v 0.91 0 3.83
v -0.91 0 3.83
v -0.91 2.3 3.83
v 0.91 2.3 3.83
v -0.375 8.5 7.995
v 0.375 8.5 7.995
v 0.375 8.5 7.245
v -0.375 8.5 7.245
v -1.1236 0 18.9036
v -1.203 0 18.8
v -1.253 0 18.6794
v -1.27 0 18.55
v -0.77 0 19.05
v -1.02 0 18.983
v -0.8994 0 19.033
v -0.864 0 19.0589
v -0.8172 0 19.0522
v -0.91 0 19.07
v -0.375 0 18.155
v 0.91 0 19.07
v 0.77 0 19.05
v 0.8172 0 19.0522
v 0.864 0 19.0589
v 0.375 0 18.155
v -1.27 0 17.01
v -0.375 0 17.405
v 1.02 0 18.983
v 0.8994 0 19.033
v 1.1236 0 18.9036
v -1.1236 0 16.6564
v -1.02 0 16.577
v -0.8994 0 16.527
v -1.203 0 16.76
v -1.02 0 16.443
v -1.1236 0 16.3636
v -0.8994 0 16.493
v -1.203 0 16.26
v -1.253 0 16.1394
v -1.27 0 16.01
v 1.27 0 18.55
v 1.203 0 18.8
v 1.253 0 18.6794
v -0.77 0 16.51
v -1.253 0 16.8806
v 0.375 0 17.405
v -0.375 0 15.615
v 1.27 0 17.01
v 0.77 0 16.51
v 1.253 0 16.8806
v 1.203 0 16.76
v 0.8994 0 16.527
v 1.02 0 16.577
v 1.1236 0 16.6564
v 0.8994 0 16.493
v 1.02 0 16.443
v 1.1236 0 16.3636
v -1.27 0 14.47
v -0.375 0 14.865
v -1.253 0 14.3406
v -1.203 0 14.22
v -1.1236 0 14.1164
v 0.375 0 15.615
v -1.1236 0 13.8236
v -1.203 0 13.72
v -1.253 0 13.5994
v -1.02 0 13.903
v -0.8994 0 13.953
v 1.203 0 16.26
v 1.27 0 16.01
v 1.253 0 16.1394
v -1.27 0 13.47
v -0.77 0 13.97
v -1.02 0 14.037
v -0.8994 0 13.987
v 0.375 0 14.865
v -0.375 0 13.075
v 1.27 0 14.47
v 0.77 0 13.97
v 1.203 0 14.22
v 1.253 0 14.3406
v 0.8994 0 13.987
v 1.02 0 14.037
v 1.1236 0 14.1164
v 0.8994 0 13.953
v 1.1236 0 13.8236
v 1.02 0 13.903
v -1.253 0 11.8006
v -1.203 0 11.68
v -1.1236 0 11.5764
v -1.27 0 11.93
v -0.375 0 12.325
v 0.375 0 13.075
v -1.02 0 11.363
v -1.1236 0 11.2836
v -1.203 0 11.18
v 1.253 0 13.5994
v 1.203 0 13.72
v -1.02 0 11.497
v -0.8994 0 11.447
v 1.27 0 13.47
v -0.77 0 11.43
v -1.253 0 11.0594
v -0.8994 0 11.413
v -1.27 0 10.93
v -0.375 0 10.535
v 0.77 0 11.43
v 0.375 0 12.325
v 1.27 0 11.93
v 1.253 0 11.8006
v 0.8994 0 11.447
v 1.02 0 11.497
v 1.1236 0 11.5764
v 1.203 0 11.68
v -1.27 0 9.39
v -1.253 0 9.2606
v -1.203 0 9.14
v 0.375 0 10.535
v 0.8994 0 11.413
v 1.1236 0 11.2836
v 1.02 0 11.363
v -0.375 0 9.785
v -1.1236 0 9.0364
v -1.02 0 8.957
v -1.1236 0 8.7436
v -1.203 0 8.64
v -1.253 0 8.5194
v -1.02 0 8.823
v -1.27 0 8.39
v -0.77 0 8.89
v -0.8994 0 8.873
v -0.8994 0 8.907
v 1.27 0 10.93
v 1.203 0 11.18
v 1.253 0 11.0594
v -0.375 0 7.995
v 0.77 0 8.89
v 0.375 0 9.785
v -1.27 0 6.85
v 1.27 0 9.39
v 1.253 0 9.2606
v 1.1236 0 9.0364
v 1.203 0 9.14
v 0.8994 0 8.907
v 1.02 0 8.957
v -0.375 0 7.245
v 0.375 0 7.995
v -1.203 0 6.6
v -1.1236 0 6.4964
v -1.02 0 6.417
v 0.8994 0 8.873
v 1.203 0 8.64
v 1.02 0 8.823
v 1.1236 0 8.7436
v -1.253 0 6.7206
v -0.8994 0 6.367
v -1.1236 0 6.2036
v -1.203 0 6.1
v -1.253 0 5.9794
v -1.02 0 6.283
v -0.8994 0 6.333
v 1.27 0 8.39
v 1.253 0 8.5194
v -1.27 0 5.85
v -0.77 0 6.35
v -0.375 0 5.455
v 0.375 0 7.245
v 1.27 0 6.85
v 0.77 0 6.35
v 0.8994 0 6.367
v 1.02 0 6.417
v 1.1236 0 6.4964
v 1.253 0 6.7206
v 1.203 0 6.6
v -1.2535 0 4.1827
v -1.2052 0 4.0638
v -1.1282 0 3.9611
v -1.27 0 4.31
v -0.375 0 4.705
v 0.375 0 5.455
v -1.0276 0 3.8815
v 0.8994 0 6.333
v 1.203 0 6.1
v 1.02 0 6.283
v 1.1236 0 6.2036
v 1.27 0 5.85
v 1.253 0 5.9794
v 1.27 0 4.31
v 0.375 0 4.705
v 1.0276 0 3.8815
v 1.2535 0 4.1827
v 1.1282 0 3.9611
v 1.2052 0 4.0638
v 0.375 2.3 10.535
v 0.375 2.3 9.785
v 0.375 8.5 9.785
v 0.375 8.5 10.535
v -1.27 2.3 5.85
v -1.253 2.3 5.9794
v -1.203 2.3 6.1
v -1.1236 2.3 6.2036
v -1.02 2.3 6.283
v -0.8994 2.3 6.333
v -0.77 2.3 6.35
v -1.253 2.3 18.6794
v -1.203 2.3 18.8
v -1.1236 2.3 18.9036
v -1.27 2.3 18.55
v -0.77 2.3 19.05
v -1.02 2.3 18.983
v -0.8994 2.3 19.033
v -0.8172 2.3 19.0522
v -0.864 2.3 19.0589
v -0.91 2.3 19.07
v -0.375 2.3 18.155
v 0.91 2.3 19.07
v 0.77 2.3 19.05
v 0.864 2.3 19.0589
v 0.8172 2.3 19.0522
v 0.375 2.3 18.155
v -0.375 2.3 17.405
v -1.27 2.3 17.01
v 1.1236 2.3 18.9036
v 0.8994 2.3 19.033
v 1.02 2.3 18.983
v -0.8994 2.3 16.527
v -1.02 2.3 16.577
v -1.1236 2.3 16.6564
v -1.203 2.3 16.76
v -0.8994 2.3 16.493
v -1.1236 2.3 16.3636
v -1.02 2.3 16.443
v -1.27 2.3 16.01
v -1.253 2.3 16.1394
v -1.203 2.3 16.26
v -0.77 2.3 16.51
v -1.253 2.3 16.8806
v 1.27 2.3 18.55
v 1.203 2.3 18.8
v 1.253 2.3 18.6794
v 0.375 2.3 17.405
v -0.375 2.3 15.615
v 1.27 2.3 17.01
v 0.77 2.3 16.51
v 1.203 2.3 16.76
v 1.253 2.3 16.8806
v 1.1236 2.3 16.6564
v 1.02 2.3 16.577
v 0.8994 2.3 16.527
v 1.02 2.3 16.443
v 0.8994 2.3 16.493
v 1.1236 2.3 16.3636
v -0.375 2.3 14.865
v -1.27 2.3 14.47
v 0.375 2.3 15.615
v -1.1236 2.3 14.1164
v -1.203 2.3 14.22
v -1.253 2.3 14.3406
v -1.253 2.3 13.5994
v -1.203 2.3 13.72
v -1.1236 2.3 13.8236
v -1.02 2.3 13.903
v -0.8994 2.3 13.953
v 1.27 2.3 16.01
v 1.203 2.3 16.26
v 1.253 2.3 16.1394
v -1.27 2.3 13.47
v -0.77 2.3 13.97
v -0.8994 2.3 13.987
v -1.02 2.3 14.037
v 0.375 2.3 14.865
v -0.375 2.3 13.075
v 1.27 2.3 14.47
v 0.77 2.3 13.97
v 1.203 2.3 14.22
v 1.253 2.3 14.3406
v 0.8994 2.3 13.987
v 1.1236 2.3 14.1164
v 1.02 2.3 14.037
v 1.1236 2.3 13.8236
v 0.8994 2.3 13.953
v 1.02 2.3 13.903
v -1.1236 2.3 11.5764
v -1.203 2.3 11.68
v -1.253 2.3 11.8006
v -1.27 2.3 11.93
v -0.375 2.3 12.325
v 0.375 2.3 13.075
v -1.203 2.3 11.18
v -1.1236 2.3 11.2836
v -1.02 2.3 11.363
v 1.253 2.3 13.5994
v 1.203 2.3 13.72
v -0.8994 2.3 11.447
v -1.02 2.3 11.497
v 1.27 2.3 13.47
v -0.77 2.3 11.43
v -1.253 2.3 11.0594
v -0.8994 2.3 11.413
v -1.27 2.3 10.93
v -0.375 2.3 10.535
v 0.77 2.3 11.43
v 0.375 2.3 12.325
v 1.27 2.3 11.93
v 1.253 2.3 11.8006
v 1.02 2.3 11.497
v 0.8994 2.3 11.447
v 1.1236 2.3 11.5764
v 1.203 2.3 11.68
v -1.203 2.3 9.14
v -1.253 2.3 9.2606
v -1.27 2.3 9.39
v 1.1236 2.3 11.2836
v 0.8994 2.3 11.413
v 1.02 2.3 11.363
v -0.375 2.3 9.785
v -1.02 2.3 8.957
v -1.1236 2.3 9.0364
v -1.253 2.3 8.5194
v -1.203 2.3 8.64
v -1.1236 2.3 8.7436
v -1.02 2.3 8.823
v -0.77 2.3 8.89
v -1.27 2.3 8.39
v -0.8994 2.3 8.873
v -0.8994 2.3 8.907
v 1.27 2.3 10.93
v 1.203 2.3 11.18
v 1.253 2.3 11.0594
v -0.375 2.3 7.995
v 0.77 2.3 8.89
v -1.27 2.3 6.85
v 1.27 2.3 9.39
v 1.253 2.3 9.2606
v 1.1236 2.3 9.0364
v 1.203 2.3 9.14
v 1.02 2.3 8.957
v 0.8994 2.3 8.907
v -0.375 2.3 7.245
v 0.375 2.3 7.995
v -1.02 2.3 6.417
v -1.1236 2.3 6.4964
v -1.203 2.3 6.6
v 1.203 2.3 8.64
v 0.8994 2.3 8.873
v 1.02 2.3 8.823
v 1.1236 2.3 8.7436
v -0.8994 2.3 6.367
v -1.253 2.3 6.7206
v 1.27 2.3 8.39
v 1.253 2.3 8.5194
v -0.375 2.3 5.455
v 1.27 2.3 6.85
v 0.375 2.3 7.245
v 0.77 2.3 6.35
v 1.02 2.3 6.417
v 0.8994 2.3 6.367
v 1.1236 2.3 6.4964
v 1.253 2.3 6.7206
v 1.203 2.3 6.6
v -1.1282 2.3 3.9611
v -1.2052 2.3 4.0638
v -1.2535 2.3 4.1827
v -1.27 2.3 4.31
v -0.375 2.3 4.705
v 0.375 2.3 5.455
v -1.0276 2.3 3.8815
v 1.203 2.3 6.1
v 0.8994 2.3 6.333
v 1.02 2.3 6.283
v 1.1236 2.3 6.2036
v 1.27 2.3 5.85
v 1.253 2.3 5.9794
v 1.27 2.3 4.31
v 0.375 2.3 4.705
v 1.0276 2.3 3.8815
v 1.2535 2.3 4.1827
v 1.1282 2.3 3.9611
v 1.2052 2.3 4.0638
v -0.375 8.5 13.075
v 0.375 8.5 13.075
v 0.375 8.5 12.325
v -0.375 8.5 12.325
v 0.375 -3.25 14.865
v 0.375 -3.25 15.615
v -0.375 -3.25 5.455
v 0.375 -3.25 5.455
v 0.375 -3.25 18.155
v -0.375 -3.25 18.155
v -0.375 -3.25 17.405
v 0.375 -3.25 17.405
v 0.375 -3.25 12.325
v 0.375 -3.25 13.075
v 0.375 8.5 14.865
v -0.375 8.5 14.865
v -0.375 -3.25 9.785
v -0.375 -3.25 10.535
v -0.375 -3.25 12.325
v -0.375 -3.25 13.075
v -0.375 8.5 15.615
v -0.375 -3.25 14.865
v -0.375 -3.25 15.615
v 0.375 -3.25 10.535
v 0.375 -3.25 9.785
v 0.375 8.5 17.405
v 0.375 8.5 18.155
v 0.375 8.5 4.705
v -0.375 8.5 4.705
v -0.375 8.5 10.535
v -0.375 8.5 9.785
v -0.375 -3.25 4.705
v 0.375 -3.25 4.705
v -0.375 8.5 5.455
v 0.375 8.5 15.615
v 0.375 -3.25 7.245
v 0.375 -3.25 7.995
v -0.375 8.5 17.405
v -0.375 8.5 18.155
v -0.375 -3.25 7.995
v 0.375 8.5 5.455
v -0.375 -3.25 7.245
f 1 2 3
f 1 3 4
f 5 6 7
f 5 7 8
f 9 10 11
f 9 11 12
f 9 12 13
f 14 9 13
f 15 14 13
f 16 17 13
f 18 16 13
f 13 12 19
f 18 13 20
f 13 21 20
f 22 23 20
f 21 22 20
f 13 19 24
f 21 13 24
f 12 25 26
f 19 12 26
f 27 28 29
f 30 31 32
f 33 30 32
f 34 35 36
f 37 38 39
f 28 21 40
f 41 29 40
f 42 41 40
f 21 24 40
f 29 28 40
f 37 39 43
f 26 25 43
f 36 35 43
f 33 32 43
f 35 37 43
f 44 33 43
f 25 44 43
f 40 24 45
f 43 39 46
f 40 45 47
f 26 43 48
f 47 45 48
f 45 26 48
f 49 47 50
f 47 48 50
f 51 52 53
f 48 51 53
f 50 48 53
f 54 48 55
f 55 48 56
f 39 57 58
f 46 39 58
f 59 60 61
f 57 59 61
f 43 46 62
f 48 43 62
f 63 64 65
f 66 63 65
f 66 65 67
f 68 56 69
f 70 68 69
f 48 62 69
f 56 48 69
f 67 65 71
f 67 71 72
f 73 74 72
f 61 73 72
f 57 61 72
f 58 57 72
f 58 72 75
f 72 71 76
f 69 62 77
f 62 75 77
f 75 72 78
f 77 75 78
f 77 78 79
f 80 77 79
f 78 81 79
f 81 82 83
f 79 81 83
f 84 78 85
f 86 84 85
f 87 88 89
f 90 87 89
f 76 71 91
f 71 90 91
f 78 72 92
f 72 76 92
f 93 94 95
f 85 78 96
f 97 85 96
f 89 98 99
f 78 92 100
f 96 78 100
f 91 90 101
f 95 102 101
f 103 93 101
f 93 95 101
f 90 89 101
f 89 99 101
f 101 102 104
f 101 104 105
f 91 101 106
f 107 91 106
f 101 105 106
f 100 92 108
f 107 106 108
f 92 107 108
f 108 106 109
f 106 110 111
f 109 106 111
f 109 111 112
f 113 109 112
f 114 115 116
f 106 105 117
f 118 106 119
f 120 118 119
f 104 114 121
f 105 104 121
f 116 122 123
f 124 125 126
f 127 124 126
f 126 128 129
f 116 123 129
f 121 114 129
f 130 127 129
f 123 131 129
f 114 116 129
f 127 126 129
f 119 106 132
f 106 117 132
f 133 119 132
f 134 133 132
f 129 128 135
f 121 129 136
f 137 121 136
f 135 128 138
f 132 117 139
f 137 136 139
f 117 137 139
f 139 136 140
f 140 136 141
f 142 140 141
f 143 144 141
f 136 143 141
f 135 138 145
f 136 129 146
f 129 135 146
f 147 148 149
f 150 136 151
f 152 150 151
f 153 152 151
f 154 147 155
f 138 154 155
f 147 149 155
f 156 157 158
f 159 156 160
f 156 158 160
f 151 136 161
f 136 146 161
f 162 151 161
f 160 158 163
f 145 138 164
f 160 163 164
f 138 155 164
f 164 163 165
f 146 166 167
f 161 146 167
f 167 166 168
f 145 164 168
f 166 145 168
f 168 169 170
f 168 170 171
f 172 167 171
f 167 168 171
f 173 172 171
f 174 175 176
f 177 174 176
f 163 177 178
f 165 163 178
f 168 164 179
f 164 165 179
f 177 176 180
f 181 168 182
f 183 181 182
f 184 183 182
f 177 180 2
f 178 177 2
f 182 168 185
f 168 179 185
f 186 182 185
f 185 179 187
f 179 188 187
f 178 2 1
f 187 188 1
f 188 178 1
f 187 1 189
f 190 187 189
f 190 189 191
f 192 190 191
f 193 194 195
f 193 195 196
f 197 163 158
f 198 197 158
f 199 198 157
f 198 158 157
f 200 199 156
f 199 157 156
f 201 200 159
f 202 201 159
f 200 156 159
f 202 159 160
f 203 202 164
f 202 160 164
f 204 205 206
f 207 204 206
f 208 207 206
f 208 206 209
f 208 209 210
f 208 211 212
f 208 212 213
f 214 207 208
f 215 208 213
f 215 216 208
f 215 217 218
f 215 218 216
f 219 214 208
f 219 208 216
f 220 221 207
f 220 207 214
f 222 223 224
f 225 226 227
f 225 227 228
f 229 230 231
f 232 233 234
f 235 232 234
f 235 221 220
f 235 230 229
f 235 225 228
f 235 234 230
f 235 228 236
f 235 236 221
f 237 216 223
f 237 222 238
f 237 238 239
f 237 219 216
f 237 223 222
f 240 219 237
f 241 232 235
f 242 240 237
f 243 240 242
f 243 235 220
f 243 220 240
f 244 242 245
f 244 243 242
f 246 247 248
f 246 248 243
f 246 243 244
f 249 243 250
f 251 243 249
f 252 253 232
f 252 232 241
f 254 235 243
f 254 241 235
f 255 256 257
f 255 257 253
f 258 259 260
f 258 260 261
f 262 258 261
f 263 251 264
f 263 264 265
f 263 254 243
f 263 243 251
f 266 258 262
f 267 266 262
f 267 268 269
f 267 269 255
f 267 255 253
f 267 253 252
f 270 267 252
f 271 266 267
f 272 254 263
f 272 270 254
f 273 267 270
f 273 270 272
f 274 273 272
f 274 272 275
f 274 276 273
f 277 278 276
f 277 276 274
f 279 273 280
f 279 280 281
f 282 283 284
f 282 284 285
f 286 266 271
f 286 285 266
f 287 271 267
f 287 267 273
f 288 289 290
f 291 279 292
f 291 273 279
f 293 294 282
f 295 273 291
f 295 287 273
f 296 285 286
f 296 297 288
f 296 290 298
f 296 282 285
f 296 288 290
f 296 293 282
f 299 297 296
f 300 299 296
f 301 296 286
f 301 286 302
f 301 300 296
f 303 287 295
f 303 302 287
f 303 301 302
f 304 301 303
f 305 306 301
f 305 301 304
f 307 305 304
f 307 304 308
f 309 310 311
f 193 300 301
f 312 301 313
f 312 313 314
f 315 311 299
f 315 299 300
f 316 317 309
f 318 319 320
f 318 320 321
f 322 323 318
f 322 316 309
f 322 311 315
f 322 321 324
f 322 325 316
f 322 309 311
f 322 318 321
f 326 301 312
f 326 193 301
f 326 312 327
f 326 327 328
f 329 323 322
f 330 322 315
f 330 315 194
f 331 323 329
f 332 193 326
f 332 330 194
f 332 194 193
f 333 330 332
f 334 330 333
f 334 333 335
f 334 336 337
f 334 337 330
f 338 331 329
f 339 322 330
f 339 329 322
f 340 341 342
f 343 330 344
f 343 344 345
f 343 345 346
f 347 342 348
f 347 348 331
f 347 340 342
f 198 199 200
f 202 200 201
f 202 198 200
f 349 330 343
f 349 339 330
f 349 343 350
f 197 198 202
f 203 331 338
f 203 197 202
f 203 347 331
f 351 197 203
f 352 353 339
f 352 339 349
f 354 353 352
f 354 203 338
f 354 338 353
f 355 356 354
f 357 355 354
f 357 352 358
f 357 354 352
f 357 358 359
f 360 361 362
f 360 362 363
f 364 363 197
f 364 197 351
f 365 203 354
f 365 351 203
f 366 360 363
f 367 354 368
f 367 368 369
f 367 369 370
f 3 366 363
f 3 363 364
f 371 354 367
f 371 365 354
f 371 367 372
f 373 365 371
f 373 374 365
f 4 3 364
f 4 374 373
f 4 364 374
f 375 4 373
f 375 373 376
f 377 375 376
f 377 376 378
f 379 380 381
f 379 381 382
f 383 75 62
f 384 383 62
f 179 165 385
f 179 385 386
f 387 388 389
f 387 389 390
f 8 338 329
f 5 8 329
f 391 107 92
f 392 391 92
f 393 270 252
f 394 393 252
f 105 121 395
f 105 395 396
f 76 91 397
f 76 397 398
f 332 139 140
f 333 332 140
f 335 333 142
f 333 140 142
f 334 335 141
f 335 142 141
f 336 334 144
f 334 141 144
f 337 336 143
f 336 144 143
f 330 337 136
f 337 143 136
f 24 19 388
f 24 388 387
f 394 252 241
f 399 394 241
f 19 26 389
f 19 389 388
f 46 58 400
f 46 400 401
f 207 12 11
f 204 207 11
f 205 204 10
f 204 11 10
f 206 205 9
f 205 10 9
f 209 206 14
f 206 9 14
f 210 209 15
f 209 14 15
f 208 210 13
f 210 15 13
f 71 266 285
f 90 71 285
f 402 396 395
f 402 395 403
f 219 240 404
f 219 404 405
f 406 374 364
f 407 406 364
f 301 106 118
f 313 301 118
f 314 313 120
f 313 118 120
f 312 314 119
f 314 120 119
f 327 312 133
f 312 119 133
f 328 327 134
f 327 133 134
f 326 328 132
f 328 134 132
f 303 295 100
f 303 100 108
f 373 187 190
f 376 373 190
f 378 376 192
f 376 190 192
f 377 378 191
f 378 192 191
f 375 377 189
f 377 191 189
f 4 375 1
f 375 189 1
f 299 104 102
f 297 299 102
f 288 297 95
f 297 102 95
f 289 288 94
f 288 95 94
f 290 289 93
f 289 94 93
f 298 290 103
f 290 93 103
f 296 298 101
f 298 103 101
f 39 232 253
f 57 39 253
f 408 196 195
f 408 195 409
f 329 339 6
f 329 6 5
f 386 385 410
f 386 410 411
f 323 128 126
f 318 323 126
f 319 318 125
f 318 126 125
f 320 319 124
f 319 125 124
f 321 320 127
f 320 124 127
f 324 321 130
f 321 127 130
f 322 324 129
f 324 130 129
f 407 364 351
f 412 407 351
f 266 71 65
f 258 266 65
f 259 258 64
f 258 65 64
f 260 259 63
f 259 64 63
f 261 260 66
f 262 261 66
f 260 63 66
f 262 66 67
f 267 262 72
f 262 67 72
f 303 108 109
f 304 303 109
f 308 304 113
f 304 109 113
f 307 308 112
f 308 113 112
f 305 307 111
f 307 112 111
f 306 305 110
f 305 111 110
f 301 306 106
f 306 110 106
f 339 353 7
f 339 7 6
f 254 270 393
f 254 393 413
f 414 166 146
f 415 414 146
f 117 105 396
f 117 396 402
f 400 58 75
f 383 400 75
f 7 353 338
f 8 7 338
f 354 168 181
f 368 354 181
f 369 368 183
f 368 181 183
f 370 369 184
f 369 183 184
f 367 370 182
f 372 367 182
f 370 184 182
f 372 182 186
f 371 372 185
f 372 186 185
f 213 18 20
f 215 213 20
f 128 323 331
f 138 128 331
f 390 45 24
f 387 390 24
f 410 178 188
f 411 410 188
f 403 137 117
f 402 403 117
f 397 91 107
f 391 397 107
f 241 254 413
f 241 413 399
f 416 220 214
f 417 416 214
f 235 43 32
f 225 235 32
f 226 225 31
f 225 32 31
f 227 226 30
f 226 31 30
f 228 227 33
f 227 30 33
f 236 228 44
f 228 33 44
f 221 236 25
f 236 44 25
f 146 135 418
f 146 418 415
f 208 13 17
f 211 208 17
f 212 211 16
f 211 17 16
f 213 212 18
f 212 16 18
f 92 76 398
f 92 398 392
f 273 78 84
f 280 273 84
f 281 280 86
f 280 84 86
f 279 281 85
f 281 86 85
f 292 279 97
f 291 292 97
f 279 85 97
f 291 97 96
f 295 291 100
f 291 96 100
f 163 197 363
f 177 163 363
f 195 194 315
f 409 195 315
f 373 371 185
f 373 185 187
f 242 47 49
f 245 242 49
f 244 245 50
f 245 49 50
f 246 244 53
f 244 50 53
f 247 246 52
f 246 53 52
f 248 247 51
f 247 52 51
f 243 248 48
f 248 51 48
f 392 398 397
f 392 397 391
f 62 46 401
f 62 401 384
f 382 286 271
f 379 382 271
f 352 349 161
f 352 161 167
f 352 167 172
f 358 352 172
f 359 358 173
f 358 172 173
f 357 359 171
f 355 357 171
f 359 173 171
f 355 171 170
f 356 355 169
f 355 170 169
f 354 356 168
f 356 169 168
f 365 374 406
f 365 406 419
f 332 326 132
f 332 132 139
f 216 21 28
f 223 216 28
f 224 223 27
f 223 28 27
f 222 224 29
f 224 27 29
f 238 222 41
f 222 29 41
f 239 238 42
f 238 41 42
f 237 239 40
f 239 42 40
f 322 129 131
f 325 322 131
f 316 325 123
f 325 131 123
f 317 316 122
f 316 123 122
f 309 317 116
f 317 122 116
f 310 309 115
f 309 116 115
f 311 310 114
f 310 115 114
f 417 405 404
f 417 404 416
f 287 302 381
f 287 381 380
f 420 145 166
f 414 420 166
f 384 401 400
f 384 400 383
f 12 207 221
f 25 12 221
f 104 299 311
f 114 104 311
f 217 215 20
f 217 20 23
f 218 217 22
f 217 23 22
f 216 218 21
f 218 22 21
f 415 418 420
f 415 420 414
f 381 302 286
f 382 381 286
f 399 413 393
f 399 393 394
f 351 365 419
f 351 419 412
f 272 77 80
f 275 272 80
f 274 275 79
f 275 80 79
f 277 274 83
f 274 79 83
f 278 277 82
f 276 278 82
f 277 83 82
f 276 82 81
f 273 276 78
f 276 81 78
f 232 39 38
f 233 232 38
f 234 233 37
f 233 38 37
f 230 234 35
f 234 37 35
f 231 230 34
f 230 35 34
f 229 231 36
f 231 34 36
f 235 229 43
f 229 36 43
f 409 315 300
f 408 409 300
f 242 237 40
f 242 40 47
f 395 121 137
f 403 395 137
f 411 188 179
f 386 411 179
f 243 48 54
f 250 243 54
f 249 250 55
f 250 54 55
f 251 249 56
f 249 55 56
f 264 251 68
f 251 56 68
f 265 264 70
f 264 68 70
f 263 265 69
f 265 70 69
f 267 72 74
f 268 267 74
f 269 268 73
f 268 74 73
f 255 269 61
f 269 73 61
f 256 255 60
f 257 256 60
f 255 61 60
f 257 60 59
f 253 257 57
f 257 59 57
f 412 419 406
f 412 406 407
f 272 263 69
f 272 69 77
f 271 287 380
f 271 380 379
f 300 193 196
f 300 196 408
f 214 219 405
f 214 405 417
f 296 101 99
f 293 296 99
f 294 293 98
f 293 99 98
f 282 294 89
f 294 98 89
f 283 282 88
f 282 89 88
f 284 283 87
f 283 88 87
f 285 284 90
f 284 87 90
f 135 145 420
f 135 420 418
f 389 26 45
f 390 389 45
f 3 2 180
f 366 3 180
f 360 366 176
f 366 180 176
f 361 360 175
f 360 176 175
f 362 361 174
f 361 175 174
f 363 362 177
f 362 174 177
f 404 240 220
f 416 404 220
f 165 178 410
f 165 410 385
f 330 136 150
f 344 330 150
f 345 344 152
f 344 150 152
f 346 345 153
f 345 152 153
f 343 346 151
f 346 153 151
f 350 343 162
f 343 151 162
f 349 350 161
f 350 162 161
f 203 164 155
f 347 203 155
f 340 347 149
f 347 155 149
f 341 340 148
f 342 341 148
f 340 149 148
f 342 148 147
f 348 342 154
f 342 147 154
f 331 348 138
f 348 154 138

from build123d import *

# Parameters (mm, degrees)
CROQUIS1_W               = 2.54
CROQUIS1_H               = 15.24
SALIENTE_EXTRUIR1_DEPTH  = 2.3
CORTAR_EXTRUIR4_DEPTH    = 2.3
CORTAR_EXTRUIR5_DEPTH    = 2.3
CORTAR_EXTRUIR6_DEPTH    = 2.3
CORTAR_EXTRUIR7_DEPTH    = 2.3
CORTAR_EXTRUIR8_DEPTH    = 2.3
CORTAR_EXTRUIR9_DEPTH    = 2.3
CORTAR_EXTRUIR10_DEPTH   = 2.3
CORTAR_EXTRUIR13_DEPTH   = 2.3
CORTAR_EXTRUIR14_DEPTH   = 2.3
CORTAR_EXTRUIR15_DEPTH   = 2.3
CORTAR_EXTRUIR16_DEPTH   = 2.3
CORTAR_EXTRUIR17_DEPTH   = 2.3
CORTAR_EXTRUIR18_DEPTH   = 2.3
CORTAR_EXTRUIR19_DEPTH   = 2.3
CROQUIS27_W              = 0.75
CROQUIS27_H              = 0.75
SALIENTE_EXTRUIR5_DEPTH  = 6.2
CROQUIS28_W              = 0.75
CROQUIS28_H              = 0.75
SALIENTE_EXTRUIR6_DEPTH  = 6.2
CROQUIS29_W              = 0.75
CROQUIS29_H              = 0.75
SALIENTE_EXTRUIR7_DEPTH  = 6.2
CROQUIS30_W              = 0.75
CROQUIS30_H              = 0.75
SALIENTE_EXTRUIR8_DEPTH  = 6.2
CROQUIS31_W              = 0.75
CROQUIS31_H              = 0.75
SALIENTE_EXTRUIR9_DEPTH  = 6.2
CROQUIS32_W              = 0.75
CROQUIS32_H              = 0.75
SALIENTE_EXTRUIR10_DEPTH = 6.2
CROQUIS38_W              = 0.75
CROQUIS38_H              = 0.75
SALIENTE_EXTRUIR16_DEPTH = 3.25
CROQUIS39_W              = 0.75
CROQUIS39_H              = 0.75
SALIENTE_EXTRUIR17_DEPTH = 3.25
CROQUIS40_W              = 0.75
CROQUIS40_H              = 0.75
SALIENTE_EXTRUIR18_DEPTH = 3.25
CROQUIS41_W              = 0.75
CROQUIS41_H              = 0.75
SALIENTE_EXTRUIR19_DEPTH = 3.25
CROQUIS42_W              = 0.75
CROQUIS42_H              = 0.75
SALIENTE_EXTRUIR20_DEPTH = 3.25
CROQUIS43_W              = 0.75
CROQUIS43_H              = 0.75
SALIENTE_EXTRUIR21_DEPTH = 3.25


with BuildPart() as part:
    # Croquis1 → Saliente-Extruir1 (new body)
    with BuildSketch(Plane(origin=(0, 2.3, 0), x_dir=(1, 0, 0), z_dir=(0, 1, 0))):
        with Locations((0, -11.45)):
            Rectangle(CROQUIS1_W, CROQUIS1_H)
    extrude(amount=-SALIENTE_EXTRUIR1_DEPTH)

    # Croquis5 → Cortar-Extruir4 (cut)
    with BuildSketch(Plane.XZ):
        with BuildLine():
            Line((1.27, 18.55), (1.27, 19.55))
            ThreePointArc((1.27, 19.55), (1.123553391, 19.196446609), (0.77, 19.05))
            ThreePointArc((0.77, 19.05), (1.123553391, 18.903553391), (1.27, 18.55))
        make_face()
    extrude(amount=-CORTAR_EXTRUIR4_DEPTH, mode=Mode.SUBTRACT)

    # Croquis6 → Cortar-Extruir5 (cut)
    with BuildSketch(Plane.XZ):
        with BuildLine():
            Line((1.27, 16.01), (1.27, 17.01))
            ThreePointArc((1.27, 17.01), (1.123553391, 16.656446609), (0.77, 16.51))
            ThreePointArc((0.77, 16.51), (1.123553391, 16.363553391), (1.27, 16.01))
        make_face()
    extrude(amount=-CORTAR_EXTRUIR5_DEPTH, mode=Mode.SUBTRACT)

    # Croquis7 → Cortar-Extruir6 (cut)
    with BuildSketch(Plane.XZ):
        with BuildLine():
            Line((1.27, 13.47), (1.27, 14.47))
            ThreePointArc((1.27, 14.47), (1.123553391, 14.116446609), (0.77, 13.97))
            ThreePointArc((0.77, 13.97), (1.123553391, 13.823553391), (1.27, 13.47))
        make_face()
    extrude(amount=-CORTAR_EXTRUIR6_DEPTH, mode=Mode.SUBTRACT)

    # Croquis8 → Cortar-Extruir7 (cut)
    with BuildSketch(Plane.XZ):
        with BuildLine():
            Line((1.27, 10.93), (1.27, 11.93))
            ThreePointArc((1.27, 11.93), (1.123553391, 11.576446609), (0.77, 11.43))
            ThreePointArc((0.77, 11.43), (1.123553391, 11.283553391), (1.27, 10.93))
        make_face()
    extrude(amount=-CORTAR_EXTRUIR7_DEPTH, mode=Mode.SUBTRACT)

    # Croquis9 → Cortar-Extruir8 (cut)
    with BuildSketch(Plane.XZ):
        with BuildLine():
            Line((1.27, 8.39), (1.27, 9.39))
            ThreePointArc((1.27, 9.39), (1.123553391, 9.036446609), (0.77, 8.89))
            ThreePointArc((0.77, 8.89), (1.123553391, 8.743553391), (1.27, 8.39))
        make_face()
    extrude(amount=-CORTAR_EXTRUIR8_DEPTH, mode=Mode.SUBTRACT)

    # Croquis10 → Cortar-Extruir9 (cut)
    with BuildSketch(Plane.XZ):
        with BuildLine():
            Line((1.27, 5.85), (1.27, 6.85))
            ThreePointArc((1.27, 6.85), (1.123553391, 6.496446609), (0.77, 6.35))
            ThreePointArc((0.77, 6.35), (1.123553391, 6.203553391), (1.27, 5.85))
        make_face()
    extrude(amount=-CORTAR_EXTRUIR9_DEPTH, mode=Mode.SUBTRACT)

    # Croquis11 → Cortar-Extruir10 (cut)
    with BuildSketch(Plane.XZ):
        with BuildLine():
            Line((1.27, 3.31), (1.27, 4.31))
            ThreePointArc((1.27, 4.31), (1.123553391, 3.956446609), (0.77, 3.81))
            ThreePointArc((0.77, 3.81), (1.123553391, 3.663553391), (1.27, 3.31))
        make_face()
    extrude(amount=-CORTAR_EXTRUIR10_DEPTH, mode=Mode.SUBTRACT)

    # Croquis14 → Cortar-Extruir13 (cut)
    with BuildSketch(Plane.XZ):
        with BuildLine():
            Line((-1.27, 4.31), (-1.27, 3.31))
            ThreePointArc((-1.27, 3.31), (-1.123553391, 3.663553391), (-0.77, 3.81))
            ThreePointArc((-0.77, 3.81), (-1.123553391, 3.956446609), (-1.27, 4.31))
        make_face()
    extrude(amount=-CORTAR_EXTRUIR13_DEPTH, mode=Mode.SUBTRACT)

    # Croquis15 → Cortar-Extruir14 (cut)
    with BuildSketch(Plane.XZ):
        with BuildLine():
            Line((-1.27, 6.85), (-1.27, 5.85))
            ThreePointArc((-1.27, 5.85), (-1.123553391, 6.203553391), (-0.77, 6.35))
            ThreePointArc((-0.77, 6.35), (-1.123553391, 6.496446609), (-1.27, 6.85))
        make_face()
    extrude(amount=-CORTAR_EXTRUIR14_DEPTH, mode=Mode.SUBTRACT)

    # Croquis16 → Cortar-Extruir15 (cut)
    with BuildSketch(Plane.XZ):
        with BuildLine():
            Line((-1.27, 9.39), (-1.27, 8.39))
            ThreePointArc((-1.27, 8.39), (-1.123553391, 8.743553391), (-0.77, 8.89))
            ThreePointArc((-0.77, 8.89), (-1.123553391, 9.036446609), (-1.27, 9.39))
        make_face()
    extrude(amount=-CORTAR_EXTRUIR15_DEPTH, mode=Mode.SUBTRACT)

    # Croquis17 → Cortar-Extruir16 (cut)
    with BuildSketch(Plane.XZ):
        with BuildLine():
            Line((-1.27, 11.93), (-1.27, 10.93))
            ThreePointArc((-1.27, 10.93), (-1.123553391, 11.283553391), (-0.77, 11.43))
            ThreePointArc((-0.77, 11.43), (-1.123553391, 11.576446609), (-1.27, 11.93))
        make_face()
    extrude(amount=-CORTAR_EXTRUIR16_DEPTH, mode=Mode.SUBTRACT)

    # Croquis18 → Cortar-Extruir17 (cut)
    with BuildSketch(Plane.XZ):
        with BuildLine():
            Line((-1.27, 14.47), (-1.27, 13.47))
            ThreePointArc((-1.27, 13.47), (-1.123553391, 13.823553391), (-0.77, 13.97))
            ThreePointArc((-0.77, 13.97), (-1.123553391, 14.116446609), (-1.27, 14.47))
        make_face()
    extrude(amount=-CORTAR_EXTRUIR17_DEPTH, mode=Mode.SUBTRACT)

    # Croquis19 → Cortar-Extruir18 (cut)
    with BuildSketch(Plane.XZ):
        with BuildLine():
            Line((-1.27, 17.01), (-1.27, 16.01))
            ThreePointArc((-1.27, 16.01), (-1.123553391, 16.363553391), (-0.77, 16.51))
            ThreePointArc((-0.77, 16.51), (-1.123553391, 16.656446609), (-1.27, 17.01))
        make_face()
    extrude(amount=-CORTAR_EXTRUIR18_DEPTH, mode=Mode.SUBTRACT)

    # Croquis20 → Cortar-Extruir19 (cut)
    with BuildSketch(Plane.XZ):
        with BuildLine():
            Line((-1.27, 19.55), (-1.27, 18.55))
            ThreePointArc((-1.27, 18.55), (-1.123553391, 18.903553391), (-0.77, 19.05))
            ThreePointArc((-0.77, 19.05), (-1.123553391, 19.196446609), (-1.27, 19.55))
        make_face()
    extrude(amount=-CORTAR_EXTRUIR19_DEPTH, mode=Mode.SUBTRACT)

    # Croquis27 → Saliente-Extruir5 (add)
    with BuildSketch(Plane(origin=(0, 2.3, 0), x_dir=(-1, 0, 0), z_dir=(0, 1, 0))):
        with Locations((0, 5.08)):
            Rectangle(CROQUIS27_W, CROQUIS27_H)
    extrude(amount=SALIENTE_EXTRUIR5_DEPTH)

    # Croquis28 → Saliente-Extruir6 (add)
    with BuildSketch(Plane(origin=(0, 2.3, 0), x_dir=(-1, 0, 0), z_dir=(0, 1, 0))):
        with Locations((0, 7.62)):
            Rectangle(CROQUIS28_W, CROQUIS28_H)
    extrude(amount=SALIENTE_EXTRUIR6_DEPTH)

    # Croquis29 → Saliente-Extruir7 (add)
    with BuildSketch(Plane(origin=(0, 2.3, 0), x_dir=(-1, 0, 0), z_dir=(0, 1, 0))):
        with Locations((0, 10.16)):
            Rectangle(CROQUIS29_W, CROQUIS29_H)
    extrude(amount=SALIENTE_EXTRUIR7_DEPTH)

    # Croquis30 → Saliente-Extruir8 (add)
    with BuildSketch(Plane(origin=(0, 2.3, 0), x_dir=(-1, 0, 0), z_dir=(0, 1, 0))):
        with Locations((0, 12.7)):
            Rectangle(CROQUIS30_W, CROQUIS30_H)
    extrude(amount=SALIENTE_EXTRUIR8_DEPTH)

    # Croquis31 → Saliente-Extruir9 (add)
    with BuildSketch(Plane(origin=(0, 2.3, 0), x_dir=(-1, 0, 0), z_dir=(0, 1, 0))):
        with Locations((0, 15.24)):
            Rectangle(CROQUIS31_W, CROQUIS31_H)
    extrude(amount=SALIENTE_EXTRUIR9_DEPTH)

    # Croquis32 → Saliente-Extruir10 (add)
    with BuildSketch(Plane(origin=(0, 2.3, 0), x_dir=(-1, 0, 0), z_dir=(0, 1, 0))):
        with Locations((0, 17.78)):
            Rectangle(CROQUIS32_W, CROQUIS32_H)
    extrude(amount=SALIENTE_EXTRUIR10_DEPTH)

    # Croquis38 → Saliente-Extruir16 (add)
    with BuildSketch(Plane.XZ):
        with Locations((0, 5.08)):
            Rectangle(CROQUIS38_W, CROQUIS38_H)
    extrude(amount=SALIENTE_EXTRUIR16_DEPTH)

    # Croquis39 → Saliente-Extruir17 (add)
    with BuildSketch(Plane.XZ):
        with Locations((0, 7.62)):
            Rectangle(CROQUIS39_W, CROQUIS39_H)
    extrude(amount=SALIENTE_EXTRUIR17_DEPTH)

    # Croquis40 → Saliente-Extruir18 (add)
    with BuildSketch(Plane.XZ):
        with Locations((0, 10.16)):
            Rectangle(CROQUIS40_W, CROQUIS40_H)
    extrude(amount=SALIENTE_EXTRUIR18_DEPTH)

    # Croquis41 → Saliente-Extruir19 (add)
    with BuildSketch(Plane.XZ):
        with Locations((0, 12.7)):
            Rectangle(CROQUIS41_W, CROQUIS41_H)
    extrude(amount=SALIENTE_EXTRUIR19_DEPTH)

    # Croquis42 → Saliente-Extruir20 (add)
    with BuildSketch(Plane.XZ):
        with Locations((0, 15.24)):
            Rectangle(CROQUIS42_W, CROQUIS42_H)
    extrude(amount=SALIENTE_EXTRUIR20_DEPTH)

    # Croquis43 → Saliente-Extruir21 (add)
    with BuildSketch(Plane.XZ):
        with Locations((0, 17.78)):
            Rectangle(CROQUIS43_W, CROQUIS43_H)
    extrude(amount=SALIENTE_EXTRUIR21_DEPTH)


solid = part.part
